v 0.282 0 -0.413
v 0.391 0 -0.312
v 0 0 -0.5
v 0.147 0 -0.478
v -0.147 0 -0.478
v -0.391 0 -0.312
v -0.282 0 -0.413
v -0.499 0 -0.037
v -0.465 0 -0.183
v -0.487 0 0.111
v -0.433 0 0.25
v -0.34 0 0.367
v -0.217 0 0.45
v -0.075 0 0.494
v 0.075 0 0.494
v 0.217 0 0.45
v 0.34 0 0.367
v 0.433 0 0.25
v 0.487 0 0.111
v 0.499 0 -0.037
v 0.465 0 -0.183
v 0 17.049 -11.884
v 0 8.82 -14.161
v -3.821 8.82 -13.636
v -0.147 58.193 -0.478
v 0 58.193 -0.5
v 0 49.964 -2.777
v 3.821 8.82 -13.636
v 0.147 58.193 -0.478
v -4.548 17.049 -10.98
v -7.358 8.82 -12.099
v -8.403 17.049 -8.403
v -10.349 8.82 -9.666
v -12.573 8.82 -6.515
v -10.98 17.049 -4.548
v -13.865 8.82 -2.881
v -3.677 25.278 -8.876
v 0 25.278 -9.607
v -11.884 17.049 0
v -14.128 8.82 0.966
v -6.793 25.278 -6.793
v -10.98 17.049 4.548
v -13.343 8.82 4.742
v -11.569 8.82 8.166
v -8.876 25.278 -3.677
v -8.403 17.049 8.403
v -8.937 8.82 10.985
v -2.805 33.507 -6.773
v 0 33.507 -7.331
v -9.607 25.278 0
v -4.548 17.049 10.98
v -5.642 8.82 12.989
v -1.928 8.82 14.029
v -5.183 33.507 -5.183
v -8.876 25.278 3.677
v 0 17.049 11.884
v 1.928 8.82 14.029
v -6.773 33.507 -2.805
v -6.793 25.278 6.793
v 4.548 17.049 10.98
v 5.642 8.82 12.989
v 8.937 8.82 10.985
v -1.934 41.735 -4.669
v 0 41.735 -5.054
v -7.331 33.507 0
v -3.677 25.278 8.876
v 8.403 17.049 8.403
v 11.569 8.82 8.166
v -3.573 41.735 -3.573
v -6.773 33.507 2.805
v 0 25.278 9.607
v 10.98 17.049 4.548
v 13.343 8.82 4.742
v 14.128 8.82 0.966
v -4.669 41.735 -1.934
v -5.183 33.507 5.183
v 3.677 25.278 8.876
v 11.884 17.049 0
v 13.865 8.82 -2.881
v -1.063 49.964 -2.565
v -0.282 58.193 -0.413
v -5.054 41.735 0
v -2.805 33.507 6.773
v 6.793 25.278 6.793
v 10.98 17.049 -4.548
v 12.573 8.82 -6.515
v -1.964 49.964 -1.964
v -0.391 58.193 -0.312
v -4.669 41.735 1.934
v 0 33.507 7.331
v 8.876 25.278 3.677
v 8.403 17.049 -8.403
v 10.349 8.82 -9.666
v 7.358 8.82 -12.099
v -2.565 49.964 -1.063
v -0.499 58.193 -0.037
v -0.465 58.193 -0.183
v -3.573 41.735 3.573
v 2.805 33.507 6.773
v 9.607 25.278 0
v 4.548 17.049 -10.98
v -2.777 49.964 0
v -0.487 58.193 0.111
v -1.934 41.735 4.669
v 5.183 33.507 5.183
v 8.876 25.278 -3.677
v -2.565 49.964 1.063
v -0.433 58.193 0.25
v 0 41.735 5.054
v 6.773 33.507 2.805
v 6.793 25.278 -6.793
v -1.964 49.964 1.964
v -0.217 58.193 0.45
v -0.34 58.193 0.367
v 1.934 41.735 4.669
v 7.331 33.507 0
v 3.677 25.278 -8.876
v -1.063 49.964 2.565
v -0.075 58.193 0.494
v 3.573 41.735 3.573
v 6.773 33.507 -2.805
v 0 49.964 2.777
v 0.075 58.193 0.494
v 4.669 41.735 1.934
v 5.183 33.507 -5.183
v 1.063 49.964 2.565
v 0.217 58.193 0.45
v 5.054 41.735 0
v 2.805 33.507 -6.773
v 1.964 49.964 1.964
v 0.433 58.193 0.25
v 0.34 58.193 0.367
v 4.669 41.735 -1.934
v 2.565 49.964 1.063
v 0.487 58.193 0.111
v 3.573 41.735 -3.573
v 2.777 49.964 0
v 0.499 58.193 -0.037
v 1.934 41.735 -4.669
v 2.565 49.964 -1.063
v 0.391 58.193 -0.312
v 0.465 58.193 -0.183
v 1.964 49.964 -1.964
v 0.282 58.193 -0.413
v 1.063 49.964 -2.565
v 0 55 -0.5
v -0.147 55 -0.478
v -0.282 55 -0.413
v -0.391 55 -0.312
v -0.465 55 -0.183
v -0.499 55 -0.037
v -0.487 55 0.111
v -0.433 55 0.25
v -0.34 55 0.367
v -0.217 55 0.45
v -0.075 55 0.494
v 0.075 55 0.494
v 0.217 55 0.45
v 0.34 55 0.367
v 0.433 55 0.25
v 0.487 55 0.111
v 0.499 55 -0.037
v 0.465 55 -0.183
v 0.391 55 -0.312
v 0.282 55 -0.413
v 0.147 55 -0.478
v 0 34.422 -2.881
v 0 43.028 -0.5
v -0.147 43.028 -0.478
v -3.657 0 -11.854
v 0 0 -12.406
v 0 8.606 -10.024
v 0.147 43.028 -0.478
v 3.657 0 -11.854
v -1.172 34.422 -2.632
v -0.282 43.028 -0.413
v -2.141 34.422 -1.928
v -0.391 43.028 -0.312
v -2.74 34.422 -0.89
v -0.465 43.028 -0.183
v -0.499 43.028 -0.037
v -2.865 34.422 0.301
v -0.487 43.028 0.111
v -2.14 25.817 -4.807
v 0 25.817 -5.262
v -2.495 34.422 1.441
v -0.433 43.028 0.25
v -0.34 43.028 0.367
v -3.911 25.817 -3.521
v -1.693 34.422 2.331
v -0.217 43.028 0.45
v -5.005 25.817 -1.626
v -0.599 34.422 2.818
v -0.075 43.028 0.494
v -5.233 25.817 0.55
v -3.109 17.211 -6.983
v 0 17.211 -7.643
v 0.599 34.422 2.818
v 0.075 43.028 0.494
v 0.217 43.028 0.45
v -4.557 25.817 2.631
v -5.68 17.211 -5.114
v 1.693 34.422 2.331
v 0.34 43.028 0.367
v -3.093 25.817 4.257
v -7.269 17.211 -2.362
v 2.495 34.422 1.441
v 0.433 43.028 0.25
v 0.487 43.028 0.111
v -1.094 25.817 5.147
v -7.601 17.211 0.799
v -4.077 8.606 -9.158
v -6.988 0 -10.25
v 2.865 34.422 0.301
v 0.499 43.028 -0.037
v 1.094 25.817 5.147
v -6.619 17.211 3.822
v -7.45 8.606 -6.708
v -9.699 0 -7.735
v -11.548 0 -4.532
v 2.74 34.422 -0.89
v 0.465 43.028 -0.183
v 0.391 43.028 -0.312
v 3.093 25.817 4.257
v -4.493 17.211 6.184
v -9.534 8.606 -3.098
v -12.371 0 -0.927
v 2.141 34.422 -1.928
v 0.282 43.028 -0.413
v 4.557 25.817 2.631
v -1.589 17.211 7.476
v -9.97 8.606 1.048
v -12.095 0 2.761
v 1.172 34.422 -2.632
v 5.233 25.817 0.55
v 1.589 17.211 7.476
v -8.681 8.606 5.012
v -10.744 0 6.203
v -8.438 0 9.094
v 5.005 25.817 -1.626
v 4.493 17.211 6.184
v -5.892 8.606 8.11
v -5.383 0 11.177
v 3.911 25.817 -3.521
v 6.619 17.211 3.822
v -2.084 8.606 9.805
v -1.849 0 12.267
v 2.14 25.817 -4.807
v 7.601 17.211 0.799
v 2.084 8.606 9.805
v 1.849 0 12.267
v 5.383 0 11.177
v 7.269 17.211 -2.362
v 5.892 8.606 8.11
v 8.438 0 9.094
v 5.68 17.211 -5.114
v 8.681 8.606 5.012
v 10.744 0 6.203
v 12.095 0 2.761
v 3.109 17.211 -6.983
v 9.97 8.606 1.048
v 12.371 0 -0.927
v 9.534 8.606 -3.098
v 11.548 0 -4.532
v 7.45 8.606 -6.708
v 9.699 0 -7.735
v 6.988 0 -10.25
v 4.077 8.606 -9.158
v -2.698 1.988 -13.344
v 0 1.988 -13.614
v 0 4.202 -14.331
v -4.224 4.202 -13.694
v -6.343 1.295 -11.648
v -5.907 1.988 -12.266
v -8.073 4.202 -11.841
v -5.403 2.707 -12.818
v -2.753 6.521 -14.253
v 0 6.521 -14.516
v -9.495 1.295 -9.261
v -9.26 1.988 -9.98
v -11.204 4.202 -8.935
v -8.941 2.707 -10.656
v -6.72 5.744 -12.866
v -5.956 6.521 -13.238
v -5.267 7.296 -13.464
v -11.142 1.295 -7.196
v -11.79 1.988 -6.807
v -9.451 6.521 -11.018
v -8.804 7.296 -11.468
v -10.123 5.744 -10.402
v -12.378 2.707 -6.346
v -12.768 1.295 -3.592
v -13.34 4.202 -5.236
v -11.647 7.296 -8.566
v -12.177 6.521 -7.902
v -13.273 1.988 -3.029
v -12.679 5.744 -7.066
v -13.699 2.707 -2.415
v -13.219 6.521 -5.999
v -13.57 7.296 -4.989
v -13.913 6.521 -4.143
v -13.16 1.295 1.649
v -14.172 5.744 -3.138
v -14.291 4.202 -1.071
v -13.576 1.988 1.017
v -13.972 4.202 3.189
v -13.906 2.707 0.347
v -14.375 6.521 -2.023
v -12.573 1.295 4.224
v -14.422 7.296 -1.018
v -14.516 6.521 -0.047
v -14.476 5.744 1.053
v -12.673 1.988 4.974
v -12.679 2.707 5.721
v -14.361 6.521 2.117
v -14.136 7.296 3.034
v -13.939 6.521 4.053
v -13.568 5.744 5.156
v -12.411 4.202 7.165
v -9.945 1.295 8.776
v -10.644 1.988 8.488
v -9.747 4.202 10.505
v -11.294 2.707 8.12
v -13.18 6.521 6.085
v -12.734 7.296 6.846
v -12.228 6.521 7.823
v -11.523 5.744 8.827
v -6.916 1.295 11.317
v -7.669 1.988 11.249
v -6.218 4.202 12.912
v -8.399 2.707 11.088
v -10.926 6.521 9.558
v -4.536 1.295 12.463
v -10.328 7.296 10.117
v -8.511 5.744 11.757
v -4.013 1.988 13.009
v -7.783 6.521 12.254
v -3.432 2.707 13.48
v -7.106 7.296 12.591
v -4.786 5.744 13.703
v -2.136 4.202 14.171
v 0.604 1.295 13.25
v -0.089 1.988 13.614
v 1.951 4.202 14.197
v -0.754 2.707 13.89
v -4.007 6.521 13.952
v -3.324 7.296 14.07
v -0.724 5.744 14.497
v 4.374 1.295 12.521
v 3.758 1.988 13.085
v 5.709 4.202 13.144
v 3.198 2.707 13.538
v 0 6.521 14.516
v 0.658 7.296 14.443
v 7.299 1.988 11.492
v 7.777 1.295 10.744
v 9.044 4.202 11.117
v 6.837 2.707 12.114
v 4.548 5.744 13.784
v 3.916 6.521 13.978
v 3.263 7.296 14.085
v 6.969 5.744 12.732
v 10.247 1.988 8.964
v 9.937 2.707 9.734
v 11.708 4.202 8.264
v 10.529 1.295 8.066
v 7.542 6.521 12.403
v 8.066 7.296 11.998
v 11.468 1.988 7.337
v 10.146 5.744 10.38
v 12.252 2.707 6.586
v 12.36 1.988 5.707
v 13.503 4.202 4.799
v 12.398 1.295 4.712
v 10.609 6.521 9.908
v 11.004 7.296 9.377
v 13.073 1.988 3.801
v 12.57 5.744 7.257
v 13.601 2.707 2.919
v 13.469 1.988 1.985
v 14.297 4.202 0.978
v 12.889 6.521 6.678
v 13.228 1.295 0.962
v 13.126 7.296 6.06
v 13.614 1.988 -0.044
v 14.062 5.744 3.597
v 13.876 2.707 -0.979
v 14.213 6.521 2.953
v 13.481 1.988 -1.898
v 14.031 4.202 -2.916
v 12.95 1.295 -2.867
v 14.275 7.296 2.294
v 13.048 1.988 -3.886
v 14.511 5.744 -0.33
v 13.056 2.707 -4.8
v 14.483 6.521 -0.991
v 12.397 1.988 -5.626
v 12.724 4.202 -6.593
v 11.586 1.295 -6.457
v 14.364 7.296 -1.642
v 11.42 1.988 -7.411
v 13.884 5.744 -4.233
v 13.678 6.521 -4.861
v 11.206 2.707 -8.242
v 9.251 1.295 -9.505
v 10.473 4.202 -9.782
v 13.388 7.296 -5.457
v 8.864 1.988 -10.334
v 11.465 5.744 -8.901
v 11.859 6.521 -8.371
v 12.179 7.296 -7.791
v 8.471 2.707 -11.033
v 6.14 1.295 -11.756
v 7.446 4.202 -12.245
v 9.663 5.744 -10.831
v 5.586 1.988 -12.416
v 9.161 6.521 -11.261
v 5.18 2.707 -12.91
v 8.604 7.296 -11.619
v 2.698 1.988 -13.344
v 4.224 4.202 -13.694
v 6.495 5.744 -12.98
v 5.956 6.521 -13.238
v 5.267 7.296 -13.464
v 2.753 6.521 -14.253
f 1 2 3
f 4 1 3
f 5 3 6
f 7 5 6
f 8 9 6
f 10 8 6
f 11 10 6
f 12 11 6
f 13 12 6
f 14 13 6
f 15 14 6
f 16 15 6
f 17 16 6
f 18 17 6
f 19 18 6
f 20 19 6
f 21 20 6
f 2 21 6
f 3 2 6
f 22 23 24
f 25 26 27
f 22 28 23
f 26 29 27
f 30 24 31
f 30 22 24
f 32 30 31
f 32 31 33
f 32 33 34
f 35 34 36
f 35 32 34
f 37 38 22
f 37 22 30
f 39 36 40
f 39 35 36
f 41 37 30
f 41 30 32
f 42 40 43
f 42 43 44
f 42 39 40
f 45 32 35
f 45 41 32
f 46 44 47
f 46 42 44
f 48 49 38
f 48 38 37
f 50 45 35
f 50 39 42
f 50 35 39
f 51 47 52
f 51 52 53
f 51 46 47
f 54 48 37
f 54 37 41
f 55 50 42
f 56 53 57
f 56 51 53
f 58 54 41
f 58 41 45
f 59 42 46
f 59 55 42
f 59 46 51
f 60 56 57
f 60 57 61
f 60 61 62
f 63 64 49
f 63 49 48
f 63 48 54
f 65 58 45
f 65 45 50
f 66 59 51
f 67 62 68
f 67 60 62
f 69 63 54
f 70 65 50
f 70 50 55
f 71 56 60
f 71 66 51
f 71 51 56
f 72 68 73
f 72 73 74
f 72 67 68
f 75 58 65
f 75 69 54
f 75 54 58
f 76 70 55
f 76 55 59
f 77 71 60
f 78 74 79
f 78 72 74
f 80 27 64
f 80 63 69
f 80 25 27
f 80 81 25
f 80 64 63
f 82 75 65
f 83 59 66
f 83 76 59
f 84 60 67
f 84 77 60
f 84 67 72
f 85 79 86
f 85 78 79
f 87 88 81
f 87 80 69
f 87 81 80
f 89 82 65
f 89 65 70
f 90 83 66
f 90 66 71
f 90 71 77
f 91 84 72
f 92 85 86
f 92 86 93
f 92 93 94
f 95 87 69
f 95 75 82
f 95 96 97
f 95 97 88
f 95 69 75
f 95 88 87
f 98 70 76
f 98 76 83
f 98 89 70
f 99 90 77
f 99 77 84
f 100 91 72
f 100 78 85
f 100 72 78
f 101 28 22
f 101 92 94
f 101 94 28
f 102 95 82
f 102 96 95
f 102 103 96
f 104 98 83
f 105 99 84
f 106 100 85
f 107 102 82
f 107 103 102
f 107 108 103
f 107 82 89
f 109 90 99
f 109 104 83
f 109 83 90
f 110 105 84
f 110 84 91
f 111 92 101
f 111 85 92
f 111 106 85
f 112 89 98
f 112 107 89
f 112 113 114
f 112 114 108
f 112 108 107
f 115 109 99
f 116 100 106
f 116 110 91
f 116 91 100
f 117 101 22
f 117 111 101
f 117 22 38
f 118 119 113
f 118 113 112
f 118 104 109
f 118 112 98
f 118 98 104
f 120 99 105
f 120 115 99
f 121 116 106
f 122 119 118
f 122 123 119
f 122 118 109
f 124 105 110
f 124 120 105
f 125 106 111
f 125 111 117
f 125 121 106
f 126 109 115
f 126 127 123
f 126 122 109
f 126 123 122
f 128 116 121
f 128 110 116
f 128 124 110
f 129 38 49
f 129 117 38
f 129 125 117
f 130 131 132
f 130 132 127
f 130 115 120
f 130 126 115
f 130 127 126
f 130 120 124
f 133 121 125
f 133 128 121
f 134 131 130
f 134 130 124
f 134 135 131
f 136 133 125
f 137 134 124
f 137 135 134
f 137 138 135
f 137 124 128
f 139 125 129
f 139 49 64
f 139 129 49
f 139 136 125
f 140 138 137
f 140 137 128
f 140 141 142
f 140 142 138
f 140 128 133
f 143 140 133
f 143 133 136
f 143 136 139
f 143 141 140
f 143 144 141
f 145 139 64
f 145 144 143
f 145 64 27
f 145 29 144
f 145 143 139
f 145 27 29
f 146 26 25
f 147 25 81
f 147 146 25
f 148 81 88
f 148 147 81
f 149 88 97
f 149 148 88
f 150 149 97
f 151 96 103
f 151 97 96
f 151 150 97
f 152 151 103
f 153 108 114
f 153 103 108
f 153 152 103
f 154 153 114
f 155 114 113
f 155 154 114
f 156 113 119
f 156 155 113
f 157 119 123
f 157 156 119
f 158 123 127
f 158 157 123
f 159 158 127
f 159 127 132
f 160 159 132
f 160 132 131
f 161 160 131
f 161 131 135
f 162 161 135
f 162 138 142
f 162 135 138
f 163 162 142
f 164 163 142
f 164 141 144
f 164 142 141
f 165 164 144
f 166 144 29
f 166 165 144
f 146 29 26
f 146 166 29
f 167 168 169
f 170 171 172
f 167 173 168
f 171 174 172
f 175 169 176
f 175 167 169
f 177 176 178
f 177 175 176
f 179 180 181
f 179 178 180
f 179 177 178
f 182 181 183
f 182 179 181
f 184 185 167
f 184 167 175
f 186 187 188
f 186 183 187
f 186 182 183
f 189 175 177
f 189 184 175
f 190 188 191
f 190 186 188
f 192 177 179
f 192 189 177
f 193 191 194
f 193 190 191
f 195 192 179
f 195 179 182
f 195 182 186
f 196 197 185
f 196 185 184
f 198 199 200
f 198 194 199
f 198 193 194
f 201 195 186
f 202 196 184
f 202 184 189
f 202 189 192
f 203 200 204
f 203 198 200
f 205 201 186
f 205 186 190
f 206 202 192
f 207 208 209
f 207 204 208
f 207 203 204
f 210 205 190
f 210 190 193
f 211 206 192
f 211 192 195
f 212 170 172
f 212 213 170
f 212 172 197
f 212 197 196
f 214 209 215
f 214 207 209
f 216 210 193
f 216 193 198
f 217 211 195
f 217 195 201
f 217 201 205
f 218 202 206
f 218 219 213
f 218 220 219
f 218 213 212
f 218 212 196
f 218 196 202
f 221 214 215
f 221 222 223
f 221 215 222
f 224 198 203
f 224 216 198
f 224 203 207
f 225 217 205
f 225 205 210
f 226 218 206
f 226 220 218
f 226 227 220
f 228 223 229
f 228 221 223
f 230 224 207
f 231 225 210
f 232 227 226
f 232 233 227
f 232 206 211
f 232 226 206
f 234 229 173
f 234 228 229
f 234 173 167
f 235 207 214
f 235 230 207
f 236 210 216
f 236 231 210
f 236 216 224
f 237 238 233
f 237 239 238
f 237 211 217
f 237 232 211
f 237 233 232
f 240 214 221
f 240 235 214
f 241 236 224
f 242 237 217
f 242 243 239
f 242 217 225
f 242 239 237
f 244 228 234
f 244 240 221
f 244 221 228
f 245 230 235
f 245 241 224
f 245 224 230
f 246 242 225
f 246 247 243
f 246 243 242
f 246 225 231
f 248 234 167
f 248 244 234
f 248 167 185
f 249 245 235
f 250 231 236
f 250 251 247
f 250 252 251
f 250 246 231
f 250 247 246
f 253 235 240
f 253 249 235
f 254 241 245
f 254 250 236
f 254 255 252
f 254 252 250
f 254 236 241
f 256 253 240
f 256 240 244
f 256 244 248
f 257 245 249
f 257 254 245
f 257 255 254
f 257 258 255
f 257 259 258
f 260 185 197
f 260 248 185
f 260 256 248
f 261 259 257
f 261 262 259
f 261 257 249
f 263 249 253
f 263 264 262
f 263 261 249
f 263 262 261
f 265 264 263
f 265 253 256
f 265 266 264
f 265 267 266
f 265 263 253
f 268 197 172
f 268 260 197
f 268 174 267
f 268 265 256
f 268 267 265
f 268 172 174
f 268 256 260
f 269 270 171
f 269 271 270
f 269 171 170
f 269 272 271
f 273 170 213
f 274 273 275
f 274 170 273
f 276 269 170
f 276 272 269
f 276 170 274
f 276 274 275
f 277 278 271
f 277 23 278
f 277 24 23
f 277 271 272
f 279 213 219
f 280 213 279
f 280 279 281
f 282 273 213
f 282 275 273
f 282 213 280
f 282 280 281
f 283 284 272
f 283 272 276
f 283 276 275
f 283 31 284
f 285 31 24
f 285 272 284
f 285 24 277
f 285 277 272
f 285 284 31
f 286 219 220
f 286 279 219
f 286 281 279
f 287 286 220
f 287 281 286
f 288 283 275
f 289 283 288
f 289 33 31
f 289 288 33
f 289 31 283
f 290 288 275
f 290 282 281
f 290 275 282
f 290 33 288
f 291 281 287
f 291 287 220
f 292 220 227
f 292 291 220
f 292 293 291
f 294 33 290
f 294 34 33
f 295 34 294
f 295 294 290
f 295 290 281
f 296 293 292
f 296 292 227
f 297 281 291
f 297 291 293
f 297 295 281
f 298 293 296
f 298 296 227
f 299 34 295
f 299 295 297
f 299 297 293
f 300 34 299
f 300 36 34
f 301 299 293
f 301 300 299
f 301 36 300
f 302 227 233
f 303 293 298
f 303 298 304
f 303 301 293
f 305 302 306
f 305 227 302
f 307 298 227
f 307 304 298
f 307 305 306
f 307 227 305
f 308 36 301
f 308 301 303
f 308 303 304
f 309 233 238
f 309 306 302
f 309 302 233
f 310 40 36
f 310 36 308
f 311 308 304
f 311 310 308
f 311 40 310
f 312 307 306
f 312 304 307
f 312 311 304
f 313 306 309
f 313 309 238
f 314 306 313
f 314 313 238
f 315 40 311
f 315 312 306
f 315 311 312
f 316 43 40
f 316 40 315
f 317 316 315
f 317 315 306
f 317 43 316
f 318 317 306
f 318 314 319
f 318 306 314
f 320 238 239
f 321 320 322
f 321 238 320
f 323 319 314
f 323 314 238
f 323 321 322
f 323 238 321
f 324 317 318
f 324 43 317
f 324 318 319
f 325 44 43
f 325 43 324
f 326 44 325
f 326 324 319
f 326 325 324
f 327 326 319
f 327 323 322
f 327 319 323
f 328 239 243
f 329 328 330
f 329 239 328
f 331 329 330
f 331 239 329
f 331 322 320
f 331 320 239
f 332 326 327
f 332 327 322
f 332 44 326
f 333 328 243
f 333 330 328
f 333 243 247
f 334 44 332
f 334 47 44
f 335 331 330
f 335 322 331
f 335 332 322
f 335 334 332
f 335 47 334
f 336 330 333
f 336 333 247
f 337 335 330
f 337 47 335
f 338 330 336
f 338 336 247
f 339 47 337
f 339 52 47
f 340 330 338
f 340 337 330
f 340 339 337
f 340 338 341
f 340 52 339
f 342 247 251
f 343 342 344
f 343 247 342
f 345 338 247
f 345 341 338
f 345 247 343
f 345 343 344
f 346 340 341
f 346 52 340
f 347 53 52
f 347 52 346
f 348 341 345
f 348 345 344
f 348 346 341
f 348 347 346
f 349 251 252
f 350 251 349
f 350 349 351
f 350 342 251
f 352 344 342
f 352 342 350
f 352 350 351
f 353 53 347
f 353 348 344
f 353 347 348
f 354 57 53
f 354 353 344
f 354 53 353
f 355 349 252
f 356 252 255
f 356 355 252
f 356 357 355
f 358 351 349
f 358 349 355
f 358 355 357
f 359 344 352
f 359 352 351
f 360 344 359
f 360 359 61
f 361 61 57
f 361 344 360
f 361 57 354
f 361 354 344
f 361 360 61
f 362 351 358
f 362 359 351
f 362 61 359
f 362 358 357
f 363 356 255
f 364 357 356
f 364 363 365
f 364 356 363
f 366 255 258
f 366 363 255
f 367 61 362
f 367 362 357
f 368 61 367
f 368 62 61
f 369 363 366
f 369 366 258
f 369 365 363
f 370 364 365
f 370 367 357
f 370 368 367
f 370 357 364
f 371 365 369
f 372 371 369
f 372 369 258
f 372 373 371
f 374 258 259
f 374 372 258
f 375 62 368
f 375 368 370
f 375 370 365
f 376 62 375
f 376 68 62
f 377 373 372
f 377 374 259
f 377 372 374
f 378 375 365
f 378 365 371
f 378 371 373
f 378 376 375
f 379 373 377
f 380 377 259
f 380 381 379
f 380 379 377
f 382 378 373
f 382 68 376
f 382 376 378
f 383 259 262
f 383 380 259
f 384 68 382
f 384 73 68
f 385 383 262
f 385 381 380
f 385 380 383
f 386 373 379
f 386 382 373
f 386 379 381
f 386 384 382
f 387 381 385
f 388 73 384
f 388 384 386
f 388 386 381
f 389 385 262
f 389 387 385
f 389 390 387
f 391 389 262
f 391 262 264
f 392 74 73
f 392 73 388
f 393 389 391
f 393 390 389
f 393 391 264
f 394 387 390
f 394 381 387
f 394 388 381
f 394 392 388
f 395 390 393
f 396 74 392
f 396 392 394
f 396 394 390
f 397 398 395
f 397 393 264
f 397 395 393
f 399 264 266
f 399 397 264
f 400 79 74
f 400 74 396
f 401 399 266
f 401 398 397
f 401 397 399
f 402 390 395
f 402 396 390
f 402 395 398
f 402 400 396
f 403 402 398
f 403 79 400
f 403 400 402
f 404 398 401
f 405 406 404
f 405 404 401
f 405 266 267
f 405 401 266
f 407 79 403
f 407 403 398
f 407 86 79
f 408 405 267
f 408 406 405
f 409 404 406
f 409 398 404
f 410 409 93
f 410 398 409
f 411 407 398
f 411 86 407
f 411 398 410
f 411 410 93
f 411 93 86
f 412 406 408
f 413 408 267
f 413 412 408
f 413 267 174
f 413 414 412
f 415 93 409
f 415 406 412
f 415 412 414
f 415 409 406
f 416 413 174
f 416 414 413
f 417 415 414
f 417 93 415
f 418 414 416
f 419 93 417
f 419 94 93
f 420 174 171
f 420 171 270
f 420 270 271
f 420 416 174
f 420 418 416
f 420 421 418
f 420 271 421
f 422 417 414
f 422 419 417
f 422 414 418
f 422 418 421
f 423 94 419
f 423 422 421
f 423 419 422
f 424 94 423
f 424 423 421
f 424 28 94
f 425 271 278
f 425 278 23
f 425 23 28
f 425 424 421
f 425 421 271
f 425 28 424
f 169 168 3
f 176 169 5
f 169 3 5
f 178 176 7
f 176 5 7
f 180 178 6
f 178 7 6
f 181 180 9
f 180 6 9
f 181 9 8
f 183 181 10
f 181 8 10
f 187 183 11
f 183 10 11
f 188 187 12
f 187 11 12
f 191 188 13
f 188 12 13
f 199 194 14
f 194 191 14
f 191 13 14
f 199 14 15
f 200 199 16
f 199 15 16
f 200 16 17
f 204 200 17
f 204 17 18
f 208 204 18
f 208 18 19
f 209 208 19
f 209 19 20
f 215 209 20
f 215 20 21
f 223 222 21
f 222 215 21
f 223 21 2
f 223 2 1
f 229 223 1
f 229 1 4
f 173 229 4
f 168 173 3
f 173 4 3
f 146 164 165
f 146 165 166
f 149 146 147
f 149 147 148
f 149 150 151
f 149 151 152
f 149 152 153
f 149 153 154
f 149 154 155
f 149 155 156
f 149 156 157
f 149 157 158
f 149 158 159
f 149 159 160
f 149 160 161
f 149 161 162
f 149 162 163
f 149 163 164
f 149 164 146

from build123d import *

# Parameters (mm, degrees)
FILLET1_R           = 10
SKETCH5_R           = 0.5
BOSS_EXTRUDE1_DEPTH = 60
CUT_EXTRUDE1_START  = -5
SKETCH7_R           = 0.5
CUT_EXTRUDE1_DEPTH  = 5


with BuildPart() as part:
    # Sketch3 → Revolve1 (revolve)
    with BuildSketch(Plane.XY, mode=Mode.PRIVATE) as revolve1_sk:
        Polygon((0, 60), (0, 44.835164835), (12.405575488, 0), (16.601578962, 0), align=None)
    revolve(revolve1_sk.sketch.rotate(Axis((0, 0, 0), (0, 1, 0)), 90), axis=Axis((0, 0, 0), (0, 1, 0)))

    # Fillet1
    # the kernel refuses this fillet: 10 mm, written as the material it takes off along each edge
    with BuildSketch(Plane(origin=(0, 0, 0), x_dir=(0, 0, -1), z_dir=(1, 0, 0))) as fillet1_piece_1:
        with BuildLine():
            CenterArc((4.523166195, 6.153667503), FILLET1_R, 322.021426145, 53.44496685)
            Line((12.405575488, 0), (12.563223674, -0.12307335))
            ThreePointArc((12.563223674, -0.12307335), (14.503577225, -0.2), (16.601578962, -0.2))
            Line((16.601578962, -0.2), (16.794336369, 0.053334622))
            Line((16.794336369, 0.053334622), (14.353793971, 8.873733224))
            Line((14.353793971, 8.873733224), (14.161036564, 8.820398602))
        make_face()
    revolve(axis=Axis((0, 0, 0), (0, 1, 0)), mode=Mode.SUBTRACT)

    # Sketch5 → Boss-Extrude1 (add)
    with BuildSketch(Plane(origin=(0, 0, 0), x_dir=(1, 0, 0), z_dir=(0, 1, 0))):
        with Locations(Location((0, 0, 0), (0, 0, 90))):
            Circle(SKETCH5_R)
    extrude(amount=BOSS_EXTRUDE1_DEPTH)

    # Sketch7 → Cut-Extrude1 (cut)
    with BuildSketch(Plane(origin=(0, 60, 0), x_dir=(1, 0, 0), z_dir=(0, 1, 0)).offset(CUT_EXTRUDE1_START)):
        with Locations(Location((0, 0, 0), (0, 0, 90))):
            Circle(SKETCH7_R)
    extrude(amount=CUT_EXTRUDE1_DEPTH, mode=Mode.SUBTRACT)


solid = part.part
